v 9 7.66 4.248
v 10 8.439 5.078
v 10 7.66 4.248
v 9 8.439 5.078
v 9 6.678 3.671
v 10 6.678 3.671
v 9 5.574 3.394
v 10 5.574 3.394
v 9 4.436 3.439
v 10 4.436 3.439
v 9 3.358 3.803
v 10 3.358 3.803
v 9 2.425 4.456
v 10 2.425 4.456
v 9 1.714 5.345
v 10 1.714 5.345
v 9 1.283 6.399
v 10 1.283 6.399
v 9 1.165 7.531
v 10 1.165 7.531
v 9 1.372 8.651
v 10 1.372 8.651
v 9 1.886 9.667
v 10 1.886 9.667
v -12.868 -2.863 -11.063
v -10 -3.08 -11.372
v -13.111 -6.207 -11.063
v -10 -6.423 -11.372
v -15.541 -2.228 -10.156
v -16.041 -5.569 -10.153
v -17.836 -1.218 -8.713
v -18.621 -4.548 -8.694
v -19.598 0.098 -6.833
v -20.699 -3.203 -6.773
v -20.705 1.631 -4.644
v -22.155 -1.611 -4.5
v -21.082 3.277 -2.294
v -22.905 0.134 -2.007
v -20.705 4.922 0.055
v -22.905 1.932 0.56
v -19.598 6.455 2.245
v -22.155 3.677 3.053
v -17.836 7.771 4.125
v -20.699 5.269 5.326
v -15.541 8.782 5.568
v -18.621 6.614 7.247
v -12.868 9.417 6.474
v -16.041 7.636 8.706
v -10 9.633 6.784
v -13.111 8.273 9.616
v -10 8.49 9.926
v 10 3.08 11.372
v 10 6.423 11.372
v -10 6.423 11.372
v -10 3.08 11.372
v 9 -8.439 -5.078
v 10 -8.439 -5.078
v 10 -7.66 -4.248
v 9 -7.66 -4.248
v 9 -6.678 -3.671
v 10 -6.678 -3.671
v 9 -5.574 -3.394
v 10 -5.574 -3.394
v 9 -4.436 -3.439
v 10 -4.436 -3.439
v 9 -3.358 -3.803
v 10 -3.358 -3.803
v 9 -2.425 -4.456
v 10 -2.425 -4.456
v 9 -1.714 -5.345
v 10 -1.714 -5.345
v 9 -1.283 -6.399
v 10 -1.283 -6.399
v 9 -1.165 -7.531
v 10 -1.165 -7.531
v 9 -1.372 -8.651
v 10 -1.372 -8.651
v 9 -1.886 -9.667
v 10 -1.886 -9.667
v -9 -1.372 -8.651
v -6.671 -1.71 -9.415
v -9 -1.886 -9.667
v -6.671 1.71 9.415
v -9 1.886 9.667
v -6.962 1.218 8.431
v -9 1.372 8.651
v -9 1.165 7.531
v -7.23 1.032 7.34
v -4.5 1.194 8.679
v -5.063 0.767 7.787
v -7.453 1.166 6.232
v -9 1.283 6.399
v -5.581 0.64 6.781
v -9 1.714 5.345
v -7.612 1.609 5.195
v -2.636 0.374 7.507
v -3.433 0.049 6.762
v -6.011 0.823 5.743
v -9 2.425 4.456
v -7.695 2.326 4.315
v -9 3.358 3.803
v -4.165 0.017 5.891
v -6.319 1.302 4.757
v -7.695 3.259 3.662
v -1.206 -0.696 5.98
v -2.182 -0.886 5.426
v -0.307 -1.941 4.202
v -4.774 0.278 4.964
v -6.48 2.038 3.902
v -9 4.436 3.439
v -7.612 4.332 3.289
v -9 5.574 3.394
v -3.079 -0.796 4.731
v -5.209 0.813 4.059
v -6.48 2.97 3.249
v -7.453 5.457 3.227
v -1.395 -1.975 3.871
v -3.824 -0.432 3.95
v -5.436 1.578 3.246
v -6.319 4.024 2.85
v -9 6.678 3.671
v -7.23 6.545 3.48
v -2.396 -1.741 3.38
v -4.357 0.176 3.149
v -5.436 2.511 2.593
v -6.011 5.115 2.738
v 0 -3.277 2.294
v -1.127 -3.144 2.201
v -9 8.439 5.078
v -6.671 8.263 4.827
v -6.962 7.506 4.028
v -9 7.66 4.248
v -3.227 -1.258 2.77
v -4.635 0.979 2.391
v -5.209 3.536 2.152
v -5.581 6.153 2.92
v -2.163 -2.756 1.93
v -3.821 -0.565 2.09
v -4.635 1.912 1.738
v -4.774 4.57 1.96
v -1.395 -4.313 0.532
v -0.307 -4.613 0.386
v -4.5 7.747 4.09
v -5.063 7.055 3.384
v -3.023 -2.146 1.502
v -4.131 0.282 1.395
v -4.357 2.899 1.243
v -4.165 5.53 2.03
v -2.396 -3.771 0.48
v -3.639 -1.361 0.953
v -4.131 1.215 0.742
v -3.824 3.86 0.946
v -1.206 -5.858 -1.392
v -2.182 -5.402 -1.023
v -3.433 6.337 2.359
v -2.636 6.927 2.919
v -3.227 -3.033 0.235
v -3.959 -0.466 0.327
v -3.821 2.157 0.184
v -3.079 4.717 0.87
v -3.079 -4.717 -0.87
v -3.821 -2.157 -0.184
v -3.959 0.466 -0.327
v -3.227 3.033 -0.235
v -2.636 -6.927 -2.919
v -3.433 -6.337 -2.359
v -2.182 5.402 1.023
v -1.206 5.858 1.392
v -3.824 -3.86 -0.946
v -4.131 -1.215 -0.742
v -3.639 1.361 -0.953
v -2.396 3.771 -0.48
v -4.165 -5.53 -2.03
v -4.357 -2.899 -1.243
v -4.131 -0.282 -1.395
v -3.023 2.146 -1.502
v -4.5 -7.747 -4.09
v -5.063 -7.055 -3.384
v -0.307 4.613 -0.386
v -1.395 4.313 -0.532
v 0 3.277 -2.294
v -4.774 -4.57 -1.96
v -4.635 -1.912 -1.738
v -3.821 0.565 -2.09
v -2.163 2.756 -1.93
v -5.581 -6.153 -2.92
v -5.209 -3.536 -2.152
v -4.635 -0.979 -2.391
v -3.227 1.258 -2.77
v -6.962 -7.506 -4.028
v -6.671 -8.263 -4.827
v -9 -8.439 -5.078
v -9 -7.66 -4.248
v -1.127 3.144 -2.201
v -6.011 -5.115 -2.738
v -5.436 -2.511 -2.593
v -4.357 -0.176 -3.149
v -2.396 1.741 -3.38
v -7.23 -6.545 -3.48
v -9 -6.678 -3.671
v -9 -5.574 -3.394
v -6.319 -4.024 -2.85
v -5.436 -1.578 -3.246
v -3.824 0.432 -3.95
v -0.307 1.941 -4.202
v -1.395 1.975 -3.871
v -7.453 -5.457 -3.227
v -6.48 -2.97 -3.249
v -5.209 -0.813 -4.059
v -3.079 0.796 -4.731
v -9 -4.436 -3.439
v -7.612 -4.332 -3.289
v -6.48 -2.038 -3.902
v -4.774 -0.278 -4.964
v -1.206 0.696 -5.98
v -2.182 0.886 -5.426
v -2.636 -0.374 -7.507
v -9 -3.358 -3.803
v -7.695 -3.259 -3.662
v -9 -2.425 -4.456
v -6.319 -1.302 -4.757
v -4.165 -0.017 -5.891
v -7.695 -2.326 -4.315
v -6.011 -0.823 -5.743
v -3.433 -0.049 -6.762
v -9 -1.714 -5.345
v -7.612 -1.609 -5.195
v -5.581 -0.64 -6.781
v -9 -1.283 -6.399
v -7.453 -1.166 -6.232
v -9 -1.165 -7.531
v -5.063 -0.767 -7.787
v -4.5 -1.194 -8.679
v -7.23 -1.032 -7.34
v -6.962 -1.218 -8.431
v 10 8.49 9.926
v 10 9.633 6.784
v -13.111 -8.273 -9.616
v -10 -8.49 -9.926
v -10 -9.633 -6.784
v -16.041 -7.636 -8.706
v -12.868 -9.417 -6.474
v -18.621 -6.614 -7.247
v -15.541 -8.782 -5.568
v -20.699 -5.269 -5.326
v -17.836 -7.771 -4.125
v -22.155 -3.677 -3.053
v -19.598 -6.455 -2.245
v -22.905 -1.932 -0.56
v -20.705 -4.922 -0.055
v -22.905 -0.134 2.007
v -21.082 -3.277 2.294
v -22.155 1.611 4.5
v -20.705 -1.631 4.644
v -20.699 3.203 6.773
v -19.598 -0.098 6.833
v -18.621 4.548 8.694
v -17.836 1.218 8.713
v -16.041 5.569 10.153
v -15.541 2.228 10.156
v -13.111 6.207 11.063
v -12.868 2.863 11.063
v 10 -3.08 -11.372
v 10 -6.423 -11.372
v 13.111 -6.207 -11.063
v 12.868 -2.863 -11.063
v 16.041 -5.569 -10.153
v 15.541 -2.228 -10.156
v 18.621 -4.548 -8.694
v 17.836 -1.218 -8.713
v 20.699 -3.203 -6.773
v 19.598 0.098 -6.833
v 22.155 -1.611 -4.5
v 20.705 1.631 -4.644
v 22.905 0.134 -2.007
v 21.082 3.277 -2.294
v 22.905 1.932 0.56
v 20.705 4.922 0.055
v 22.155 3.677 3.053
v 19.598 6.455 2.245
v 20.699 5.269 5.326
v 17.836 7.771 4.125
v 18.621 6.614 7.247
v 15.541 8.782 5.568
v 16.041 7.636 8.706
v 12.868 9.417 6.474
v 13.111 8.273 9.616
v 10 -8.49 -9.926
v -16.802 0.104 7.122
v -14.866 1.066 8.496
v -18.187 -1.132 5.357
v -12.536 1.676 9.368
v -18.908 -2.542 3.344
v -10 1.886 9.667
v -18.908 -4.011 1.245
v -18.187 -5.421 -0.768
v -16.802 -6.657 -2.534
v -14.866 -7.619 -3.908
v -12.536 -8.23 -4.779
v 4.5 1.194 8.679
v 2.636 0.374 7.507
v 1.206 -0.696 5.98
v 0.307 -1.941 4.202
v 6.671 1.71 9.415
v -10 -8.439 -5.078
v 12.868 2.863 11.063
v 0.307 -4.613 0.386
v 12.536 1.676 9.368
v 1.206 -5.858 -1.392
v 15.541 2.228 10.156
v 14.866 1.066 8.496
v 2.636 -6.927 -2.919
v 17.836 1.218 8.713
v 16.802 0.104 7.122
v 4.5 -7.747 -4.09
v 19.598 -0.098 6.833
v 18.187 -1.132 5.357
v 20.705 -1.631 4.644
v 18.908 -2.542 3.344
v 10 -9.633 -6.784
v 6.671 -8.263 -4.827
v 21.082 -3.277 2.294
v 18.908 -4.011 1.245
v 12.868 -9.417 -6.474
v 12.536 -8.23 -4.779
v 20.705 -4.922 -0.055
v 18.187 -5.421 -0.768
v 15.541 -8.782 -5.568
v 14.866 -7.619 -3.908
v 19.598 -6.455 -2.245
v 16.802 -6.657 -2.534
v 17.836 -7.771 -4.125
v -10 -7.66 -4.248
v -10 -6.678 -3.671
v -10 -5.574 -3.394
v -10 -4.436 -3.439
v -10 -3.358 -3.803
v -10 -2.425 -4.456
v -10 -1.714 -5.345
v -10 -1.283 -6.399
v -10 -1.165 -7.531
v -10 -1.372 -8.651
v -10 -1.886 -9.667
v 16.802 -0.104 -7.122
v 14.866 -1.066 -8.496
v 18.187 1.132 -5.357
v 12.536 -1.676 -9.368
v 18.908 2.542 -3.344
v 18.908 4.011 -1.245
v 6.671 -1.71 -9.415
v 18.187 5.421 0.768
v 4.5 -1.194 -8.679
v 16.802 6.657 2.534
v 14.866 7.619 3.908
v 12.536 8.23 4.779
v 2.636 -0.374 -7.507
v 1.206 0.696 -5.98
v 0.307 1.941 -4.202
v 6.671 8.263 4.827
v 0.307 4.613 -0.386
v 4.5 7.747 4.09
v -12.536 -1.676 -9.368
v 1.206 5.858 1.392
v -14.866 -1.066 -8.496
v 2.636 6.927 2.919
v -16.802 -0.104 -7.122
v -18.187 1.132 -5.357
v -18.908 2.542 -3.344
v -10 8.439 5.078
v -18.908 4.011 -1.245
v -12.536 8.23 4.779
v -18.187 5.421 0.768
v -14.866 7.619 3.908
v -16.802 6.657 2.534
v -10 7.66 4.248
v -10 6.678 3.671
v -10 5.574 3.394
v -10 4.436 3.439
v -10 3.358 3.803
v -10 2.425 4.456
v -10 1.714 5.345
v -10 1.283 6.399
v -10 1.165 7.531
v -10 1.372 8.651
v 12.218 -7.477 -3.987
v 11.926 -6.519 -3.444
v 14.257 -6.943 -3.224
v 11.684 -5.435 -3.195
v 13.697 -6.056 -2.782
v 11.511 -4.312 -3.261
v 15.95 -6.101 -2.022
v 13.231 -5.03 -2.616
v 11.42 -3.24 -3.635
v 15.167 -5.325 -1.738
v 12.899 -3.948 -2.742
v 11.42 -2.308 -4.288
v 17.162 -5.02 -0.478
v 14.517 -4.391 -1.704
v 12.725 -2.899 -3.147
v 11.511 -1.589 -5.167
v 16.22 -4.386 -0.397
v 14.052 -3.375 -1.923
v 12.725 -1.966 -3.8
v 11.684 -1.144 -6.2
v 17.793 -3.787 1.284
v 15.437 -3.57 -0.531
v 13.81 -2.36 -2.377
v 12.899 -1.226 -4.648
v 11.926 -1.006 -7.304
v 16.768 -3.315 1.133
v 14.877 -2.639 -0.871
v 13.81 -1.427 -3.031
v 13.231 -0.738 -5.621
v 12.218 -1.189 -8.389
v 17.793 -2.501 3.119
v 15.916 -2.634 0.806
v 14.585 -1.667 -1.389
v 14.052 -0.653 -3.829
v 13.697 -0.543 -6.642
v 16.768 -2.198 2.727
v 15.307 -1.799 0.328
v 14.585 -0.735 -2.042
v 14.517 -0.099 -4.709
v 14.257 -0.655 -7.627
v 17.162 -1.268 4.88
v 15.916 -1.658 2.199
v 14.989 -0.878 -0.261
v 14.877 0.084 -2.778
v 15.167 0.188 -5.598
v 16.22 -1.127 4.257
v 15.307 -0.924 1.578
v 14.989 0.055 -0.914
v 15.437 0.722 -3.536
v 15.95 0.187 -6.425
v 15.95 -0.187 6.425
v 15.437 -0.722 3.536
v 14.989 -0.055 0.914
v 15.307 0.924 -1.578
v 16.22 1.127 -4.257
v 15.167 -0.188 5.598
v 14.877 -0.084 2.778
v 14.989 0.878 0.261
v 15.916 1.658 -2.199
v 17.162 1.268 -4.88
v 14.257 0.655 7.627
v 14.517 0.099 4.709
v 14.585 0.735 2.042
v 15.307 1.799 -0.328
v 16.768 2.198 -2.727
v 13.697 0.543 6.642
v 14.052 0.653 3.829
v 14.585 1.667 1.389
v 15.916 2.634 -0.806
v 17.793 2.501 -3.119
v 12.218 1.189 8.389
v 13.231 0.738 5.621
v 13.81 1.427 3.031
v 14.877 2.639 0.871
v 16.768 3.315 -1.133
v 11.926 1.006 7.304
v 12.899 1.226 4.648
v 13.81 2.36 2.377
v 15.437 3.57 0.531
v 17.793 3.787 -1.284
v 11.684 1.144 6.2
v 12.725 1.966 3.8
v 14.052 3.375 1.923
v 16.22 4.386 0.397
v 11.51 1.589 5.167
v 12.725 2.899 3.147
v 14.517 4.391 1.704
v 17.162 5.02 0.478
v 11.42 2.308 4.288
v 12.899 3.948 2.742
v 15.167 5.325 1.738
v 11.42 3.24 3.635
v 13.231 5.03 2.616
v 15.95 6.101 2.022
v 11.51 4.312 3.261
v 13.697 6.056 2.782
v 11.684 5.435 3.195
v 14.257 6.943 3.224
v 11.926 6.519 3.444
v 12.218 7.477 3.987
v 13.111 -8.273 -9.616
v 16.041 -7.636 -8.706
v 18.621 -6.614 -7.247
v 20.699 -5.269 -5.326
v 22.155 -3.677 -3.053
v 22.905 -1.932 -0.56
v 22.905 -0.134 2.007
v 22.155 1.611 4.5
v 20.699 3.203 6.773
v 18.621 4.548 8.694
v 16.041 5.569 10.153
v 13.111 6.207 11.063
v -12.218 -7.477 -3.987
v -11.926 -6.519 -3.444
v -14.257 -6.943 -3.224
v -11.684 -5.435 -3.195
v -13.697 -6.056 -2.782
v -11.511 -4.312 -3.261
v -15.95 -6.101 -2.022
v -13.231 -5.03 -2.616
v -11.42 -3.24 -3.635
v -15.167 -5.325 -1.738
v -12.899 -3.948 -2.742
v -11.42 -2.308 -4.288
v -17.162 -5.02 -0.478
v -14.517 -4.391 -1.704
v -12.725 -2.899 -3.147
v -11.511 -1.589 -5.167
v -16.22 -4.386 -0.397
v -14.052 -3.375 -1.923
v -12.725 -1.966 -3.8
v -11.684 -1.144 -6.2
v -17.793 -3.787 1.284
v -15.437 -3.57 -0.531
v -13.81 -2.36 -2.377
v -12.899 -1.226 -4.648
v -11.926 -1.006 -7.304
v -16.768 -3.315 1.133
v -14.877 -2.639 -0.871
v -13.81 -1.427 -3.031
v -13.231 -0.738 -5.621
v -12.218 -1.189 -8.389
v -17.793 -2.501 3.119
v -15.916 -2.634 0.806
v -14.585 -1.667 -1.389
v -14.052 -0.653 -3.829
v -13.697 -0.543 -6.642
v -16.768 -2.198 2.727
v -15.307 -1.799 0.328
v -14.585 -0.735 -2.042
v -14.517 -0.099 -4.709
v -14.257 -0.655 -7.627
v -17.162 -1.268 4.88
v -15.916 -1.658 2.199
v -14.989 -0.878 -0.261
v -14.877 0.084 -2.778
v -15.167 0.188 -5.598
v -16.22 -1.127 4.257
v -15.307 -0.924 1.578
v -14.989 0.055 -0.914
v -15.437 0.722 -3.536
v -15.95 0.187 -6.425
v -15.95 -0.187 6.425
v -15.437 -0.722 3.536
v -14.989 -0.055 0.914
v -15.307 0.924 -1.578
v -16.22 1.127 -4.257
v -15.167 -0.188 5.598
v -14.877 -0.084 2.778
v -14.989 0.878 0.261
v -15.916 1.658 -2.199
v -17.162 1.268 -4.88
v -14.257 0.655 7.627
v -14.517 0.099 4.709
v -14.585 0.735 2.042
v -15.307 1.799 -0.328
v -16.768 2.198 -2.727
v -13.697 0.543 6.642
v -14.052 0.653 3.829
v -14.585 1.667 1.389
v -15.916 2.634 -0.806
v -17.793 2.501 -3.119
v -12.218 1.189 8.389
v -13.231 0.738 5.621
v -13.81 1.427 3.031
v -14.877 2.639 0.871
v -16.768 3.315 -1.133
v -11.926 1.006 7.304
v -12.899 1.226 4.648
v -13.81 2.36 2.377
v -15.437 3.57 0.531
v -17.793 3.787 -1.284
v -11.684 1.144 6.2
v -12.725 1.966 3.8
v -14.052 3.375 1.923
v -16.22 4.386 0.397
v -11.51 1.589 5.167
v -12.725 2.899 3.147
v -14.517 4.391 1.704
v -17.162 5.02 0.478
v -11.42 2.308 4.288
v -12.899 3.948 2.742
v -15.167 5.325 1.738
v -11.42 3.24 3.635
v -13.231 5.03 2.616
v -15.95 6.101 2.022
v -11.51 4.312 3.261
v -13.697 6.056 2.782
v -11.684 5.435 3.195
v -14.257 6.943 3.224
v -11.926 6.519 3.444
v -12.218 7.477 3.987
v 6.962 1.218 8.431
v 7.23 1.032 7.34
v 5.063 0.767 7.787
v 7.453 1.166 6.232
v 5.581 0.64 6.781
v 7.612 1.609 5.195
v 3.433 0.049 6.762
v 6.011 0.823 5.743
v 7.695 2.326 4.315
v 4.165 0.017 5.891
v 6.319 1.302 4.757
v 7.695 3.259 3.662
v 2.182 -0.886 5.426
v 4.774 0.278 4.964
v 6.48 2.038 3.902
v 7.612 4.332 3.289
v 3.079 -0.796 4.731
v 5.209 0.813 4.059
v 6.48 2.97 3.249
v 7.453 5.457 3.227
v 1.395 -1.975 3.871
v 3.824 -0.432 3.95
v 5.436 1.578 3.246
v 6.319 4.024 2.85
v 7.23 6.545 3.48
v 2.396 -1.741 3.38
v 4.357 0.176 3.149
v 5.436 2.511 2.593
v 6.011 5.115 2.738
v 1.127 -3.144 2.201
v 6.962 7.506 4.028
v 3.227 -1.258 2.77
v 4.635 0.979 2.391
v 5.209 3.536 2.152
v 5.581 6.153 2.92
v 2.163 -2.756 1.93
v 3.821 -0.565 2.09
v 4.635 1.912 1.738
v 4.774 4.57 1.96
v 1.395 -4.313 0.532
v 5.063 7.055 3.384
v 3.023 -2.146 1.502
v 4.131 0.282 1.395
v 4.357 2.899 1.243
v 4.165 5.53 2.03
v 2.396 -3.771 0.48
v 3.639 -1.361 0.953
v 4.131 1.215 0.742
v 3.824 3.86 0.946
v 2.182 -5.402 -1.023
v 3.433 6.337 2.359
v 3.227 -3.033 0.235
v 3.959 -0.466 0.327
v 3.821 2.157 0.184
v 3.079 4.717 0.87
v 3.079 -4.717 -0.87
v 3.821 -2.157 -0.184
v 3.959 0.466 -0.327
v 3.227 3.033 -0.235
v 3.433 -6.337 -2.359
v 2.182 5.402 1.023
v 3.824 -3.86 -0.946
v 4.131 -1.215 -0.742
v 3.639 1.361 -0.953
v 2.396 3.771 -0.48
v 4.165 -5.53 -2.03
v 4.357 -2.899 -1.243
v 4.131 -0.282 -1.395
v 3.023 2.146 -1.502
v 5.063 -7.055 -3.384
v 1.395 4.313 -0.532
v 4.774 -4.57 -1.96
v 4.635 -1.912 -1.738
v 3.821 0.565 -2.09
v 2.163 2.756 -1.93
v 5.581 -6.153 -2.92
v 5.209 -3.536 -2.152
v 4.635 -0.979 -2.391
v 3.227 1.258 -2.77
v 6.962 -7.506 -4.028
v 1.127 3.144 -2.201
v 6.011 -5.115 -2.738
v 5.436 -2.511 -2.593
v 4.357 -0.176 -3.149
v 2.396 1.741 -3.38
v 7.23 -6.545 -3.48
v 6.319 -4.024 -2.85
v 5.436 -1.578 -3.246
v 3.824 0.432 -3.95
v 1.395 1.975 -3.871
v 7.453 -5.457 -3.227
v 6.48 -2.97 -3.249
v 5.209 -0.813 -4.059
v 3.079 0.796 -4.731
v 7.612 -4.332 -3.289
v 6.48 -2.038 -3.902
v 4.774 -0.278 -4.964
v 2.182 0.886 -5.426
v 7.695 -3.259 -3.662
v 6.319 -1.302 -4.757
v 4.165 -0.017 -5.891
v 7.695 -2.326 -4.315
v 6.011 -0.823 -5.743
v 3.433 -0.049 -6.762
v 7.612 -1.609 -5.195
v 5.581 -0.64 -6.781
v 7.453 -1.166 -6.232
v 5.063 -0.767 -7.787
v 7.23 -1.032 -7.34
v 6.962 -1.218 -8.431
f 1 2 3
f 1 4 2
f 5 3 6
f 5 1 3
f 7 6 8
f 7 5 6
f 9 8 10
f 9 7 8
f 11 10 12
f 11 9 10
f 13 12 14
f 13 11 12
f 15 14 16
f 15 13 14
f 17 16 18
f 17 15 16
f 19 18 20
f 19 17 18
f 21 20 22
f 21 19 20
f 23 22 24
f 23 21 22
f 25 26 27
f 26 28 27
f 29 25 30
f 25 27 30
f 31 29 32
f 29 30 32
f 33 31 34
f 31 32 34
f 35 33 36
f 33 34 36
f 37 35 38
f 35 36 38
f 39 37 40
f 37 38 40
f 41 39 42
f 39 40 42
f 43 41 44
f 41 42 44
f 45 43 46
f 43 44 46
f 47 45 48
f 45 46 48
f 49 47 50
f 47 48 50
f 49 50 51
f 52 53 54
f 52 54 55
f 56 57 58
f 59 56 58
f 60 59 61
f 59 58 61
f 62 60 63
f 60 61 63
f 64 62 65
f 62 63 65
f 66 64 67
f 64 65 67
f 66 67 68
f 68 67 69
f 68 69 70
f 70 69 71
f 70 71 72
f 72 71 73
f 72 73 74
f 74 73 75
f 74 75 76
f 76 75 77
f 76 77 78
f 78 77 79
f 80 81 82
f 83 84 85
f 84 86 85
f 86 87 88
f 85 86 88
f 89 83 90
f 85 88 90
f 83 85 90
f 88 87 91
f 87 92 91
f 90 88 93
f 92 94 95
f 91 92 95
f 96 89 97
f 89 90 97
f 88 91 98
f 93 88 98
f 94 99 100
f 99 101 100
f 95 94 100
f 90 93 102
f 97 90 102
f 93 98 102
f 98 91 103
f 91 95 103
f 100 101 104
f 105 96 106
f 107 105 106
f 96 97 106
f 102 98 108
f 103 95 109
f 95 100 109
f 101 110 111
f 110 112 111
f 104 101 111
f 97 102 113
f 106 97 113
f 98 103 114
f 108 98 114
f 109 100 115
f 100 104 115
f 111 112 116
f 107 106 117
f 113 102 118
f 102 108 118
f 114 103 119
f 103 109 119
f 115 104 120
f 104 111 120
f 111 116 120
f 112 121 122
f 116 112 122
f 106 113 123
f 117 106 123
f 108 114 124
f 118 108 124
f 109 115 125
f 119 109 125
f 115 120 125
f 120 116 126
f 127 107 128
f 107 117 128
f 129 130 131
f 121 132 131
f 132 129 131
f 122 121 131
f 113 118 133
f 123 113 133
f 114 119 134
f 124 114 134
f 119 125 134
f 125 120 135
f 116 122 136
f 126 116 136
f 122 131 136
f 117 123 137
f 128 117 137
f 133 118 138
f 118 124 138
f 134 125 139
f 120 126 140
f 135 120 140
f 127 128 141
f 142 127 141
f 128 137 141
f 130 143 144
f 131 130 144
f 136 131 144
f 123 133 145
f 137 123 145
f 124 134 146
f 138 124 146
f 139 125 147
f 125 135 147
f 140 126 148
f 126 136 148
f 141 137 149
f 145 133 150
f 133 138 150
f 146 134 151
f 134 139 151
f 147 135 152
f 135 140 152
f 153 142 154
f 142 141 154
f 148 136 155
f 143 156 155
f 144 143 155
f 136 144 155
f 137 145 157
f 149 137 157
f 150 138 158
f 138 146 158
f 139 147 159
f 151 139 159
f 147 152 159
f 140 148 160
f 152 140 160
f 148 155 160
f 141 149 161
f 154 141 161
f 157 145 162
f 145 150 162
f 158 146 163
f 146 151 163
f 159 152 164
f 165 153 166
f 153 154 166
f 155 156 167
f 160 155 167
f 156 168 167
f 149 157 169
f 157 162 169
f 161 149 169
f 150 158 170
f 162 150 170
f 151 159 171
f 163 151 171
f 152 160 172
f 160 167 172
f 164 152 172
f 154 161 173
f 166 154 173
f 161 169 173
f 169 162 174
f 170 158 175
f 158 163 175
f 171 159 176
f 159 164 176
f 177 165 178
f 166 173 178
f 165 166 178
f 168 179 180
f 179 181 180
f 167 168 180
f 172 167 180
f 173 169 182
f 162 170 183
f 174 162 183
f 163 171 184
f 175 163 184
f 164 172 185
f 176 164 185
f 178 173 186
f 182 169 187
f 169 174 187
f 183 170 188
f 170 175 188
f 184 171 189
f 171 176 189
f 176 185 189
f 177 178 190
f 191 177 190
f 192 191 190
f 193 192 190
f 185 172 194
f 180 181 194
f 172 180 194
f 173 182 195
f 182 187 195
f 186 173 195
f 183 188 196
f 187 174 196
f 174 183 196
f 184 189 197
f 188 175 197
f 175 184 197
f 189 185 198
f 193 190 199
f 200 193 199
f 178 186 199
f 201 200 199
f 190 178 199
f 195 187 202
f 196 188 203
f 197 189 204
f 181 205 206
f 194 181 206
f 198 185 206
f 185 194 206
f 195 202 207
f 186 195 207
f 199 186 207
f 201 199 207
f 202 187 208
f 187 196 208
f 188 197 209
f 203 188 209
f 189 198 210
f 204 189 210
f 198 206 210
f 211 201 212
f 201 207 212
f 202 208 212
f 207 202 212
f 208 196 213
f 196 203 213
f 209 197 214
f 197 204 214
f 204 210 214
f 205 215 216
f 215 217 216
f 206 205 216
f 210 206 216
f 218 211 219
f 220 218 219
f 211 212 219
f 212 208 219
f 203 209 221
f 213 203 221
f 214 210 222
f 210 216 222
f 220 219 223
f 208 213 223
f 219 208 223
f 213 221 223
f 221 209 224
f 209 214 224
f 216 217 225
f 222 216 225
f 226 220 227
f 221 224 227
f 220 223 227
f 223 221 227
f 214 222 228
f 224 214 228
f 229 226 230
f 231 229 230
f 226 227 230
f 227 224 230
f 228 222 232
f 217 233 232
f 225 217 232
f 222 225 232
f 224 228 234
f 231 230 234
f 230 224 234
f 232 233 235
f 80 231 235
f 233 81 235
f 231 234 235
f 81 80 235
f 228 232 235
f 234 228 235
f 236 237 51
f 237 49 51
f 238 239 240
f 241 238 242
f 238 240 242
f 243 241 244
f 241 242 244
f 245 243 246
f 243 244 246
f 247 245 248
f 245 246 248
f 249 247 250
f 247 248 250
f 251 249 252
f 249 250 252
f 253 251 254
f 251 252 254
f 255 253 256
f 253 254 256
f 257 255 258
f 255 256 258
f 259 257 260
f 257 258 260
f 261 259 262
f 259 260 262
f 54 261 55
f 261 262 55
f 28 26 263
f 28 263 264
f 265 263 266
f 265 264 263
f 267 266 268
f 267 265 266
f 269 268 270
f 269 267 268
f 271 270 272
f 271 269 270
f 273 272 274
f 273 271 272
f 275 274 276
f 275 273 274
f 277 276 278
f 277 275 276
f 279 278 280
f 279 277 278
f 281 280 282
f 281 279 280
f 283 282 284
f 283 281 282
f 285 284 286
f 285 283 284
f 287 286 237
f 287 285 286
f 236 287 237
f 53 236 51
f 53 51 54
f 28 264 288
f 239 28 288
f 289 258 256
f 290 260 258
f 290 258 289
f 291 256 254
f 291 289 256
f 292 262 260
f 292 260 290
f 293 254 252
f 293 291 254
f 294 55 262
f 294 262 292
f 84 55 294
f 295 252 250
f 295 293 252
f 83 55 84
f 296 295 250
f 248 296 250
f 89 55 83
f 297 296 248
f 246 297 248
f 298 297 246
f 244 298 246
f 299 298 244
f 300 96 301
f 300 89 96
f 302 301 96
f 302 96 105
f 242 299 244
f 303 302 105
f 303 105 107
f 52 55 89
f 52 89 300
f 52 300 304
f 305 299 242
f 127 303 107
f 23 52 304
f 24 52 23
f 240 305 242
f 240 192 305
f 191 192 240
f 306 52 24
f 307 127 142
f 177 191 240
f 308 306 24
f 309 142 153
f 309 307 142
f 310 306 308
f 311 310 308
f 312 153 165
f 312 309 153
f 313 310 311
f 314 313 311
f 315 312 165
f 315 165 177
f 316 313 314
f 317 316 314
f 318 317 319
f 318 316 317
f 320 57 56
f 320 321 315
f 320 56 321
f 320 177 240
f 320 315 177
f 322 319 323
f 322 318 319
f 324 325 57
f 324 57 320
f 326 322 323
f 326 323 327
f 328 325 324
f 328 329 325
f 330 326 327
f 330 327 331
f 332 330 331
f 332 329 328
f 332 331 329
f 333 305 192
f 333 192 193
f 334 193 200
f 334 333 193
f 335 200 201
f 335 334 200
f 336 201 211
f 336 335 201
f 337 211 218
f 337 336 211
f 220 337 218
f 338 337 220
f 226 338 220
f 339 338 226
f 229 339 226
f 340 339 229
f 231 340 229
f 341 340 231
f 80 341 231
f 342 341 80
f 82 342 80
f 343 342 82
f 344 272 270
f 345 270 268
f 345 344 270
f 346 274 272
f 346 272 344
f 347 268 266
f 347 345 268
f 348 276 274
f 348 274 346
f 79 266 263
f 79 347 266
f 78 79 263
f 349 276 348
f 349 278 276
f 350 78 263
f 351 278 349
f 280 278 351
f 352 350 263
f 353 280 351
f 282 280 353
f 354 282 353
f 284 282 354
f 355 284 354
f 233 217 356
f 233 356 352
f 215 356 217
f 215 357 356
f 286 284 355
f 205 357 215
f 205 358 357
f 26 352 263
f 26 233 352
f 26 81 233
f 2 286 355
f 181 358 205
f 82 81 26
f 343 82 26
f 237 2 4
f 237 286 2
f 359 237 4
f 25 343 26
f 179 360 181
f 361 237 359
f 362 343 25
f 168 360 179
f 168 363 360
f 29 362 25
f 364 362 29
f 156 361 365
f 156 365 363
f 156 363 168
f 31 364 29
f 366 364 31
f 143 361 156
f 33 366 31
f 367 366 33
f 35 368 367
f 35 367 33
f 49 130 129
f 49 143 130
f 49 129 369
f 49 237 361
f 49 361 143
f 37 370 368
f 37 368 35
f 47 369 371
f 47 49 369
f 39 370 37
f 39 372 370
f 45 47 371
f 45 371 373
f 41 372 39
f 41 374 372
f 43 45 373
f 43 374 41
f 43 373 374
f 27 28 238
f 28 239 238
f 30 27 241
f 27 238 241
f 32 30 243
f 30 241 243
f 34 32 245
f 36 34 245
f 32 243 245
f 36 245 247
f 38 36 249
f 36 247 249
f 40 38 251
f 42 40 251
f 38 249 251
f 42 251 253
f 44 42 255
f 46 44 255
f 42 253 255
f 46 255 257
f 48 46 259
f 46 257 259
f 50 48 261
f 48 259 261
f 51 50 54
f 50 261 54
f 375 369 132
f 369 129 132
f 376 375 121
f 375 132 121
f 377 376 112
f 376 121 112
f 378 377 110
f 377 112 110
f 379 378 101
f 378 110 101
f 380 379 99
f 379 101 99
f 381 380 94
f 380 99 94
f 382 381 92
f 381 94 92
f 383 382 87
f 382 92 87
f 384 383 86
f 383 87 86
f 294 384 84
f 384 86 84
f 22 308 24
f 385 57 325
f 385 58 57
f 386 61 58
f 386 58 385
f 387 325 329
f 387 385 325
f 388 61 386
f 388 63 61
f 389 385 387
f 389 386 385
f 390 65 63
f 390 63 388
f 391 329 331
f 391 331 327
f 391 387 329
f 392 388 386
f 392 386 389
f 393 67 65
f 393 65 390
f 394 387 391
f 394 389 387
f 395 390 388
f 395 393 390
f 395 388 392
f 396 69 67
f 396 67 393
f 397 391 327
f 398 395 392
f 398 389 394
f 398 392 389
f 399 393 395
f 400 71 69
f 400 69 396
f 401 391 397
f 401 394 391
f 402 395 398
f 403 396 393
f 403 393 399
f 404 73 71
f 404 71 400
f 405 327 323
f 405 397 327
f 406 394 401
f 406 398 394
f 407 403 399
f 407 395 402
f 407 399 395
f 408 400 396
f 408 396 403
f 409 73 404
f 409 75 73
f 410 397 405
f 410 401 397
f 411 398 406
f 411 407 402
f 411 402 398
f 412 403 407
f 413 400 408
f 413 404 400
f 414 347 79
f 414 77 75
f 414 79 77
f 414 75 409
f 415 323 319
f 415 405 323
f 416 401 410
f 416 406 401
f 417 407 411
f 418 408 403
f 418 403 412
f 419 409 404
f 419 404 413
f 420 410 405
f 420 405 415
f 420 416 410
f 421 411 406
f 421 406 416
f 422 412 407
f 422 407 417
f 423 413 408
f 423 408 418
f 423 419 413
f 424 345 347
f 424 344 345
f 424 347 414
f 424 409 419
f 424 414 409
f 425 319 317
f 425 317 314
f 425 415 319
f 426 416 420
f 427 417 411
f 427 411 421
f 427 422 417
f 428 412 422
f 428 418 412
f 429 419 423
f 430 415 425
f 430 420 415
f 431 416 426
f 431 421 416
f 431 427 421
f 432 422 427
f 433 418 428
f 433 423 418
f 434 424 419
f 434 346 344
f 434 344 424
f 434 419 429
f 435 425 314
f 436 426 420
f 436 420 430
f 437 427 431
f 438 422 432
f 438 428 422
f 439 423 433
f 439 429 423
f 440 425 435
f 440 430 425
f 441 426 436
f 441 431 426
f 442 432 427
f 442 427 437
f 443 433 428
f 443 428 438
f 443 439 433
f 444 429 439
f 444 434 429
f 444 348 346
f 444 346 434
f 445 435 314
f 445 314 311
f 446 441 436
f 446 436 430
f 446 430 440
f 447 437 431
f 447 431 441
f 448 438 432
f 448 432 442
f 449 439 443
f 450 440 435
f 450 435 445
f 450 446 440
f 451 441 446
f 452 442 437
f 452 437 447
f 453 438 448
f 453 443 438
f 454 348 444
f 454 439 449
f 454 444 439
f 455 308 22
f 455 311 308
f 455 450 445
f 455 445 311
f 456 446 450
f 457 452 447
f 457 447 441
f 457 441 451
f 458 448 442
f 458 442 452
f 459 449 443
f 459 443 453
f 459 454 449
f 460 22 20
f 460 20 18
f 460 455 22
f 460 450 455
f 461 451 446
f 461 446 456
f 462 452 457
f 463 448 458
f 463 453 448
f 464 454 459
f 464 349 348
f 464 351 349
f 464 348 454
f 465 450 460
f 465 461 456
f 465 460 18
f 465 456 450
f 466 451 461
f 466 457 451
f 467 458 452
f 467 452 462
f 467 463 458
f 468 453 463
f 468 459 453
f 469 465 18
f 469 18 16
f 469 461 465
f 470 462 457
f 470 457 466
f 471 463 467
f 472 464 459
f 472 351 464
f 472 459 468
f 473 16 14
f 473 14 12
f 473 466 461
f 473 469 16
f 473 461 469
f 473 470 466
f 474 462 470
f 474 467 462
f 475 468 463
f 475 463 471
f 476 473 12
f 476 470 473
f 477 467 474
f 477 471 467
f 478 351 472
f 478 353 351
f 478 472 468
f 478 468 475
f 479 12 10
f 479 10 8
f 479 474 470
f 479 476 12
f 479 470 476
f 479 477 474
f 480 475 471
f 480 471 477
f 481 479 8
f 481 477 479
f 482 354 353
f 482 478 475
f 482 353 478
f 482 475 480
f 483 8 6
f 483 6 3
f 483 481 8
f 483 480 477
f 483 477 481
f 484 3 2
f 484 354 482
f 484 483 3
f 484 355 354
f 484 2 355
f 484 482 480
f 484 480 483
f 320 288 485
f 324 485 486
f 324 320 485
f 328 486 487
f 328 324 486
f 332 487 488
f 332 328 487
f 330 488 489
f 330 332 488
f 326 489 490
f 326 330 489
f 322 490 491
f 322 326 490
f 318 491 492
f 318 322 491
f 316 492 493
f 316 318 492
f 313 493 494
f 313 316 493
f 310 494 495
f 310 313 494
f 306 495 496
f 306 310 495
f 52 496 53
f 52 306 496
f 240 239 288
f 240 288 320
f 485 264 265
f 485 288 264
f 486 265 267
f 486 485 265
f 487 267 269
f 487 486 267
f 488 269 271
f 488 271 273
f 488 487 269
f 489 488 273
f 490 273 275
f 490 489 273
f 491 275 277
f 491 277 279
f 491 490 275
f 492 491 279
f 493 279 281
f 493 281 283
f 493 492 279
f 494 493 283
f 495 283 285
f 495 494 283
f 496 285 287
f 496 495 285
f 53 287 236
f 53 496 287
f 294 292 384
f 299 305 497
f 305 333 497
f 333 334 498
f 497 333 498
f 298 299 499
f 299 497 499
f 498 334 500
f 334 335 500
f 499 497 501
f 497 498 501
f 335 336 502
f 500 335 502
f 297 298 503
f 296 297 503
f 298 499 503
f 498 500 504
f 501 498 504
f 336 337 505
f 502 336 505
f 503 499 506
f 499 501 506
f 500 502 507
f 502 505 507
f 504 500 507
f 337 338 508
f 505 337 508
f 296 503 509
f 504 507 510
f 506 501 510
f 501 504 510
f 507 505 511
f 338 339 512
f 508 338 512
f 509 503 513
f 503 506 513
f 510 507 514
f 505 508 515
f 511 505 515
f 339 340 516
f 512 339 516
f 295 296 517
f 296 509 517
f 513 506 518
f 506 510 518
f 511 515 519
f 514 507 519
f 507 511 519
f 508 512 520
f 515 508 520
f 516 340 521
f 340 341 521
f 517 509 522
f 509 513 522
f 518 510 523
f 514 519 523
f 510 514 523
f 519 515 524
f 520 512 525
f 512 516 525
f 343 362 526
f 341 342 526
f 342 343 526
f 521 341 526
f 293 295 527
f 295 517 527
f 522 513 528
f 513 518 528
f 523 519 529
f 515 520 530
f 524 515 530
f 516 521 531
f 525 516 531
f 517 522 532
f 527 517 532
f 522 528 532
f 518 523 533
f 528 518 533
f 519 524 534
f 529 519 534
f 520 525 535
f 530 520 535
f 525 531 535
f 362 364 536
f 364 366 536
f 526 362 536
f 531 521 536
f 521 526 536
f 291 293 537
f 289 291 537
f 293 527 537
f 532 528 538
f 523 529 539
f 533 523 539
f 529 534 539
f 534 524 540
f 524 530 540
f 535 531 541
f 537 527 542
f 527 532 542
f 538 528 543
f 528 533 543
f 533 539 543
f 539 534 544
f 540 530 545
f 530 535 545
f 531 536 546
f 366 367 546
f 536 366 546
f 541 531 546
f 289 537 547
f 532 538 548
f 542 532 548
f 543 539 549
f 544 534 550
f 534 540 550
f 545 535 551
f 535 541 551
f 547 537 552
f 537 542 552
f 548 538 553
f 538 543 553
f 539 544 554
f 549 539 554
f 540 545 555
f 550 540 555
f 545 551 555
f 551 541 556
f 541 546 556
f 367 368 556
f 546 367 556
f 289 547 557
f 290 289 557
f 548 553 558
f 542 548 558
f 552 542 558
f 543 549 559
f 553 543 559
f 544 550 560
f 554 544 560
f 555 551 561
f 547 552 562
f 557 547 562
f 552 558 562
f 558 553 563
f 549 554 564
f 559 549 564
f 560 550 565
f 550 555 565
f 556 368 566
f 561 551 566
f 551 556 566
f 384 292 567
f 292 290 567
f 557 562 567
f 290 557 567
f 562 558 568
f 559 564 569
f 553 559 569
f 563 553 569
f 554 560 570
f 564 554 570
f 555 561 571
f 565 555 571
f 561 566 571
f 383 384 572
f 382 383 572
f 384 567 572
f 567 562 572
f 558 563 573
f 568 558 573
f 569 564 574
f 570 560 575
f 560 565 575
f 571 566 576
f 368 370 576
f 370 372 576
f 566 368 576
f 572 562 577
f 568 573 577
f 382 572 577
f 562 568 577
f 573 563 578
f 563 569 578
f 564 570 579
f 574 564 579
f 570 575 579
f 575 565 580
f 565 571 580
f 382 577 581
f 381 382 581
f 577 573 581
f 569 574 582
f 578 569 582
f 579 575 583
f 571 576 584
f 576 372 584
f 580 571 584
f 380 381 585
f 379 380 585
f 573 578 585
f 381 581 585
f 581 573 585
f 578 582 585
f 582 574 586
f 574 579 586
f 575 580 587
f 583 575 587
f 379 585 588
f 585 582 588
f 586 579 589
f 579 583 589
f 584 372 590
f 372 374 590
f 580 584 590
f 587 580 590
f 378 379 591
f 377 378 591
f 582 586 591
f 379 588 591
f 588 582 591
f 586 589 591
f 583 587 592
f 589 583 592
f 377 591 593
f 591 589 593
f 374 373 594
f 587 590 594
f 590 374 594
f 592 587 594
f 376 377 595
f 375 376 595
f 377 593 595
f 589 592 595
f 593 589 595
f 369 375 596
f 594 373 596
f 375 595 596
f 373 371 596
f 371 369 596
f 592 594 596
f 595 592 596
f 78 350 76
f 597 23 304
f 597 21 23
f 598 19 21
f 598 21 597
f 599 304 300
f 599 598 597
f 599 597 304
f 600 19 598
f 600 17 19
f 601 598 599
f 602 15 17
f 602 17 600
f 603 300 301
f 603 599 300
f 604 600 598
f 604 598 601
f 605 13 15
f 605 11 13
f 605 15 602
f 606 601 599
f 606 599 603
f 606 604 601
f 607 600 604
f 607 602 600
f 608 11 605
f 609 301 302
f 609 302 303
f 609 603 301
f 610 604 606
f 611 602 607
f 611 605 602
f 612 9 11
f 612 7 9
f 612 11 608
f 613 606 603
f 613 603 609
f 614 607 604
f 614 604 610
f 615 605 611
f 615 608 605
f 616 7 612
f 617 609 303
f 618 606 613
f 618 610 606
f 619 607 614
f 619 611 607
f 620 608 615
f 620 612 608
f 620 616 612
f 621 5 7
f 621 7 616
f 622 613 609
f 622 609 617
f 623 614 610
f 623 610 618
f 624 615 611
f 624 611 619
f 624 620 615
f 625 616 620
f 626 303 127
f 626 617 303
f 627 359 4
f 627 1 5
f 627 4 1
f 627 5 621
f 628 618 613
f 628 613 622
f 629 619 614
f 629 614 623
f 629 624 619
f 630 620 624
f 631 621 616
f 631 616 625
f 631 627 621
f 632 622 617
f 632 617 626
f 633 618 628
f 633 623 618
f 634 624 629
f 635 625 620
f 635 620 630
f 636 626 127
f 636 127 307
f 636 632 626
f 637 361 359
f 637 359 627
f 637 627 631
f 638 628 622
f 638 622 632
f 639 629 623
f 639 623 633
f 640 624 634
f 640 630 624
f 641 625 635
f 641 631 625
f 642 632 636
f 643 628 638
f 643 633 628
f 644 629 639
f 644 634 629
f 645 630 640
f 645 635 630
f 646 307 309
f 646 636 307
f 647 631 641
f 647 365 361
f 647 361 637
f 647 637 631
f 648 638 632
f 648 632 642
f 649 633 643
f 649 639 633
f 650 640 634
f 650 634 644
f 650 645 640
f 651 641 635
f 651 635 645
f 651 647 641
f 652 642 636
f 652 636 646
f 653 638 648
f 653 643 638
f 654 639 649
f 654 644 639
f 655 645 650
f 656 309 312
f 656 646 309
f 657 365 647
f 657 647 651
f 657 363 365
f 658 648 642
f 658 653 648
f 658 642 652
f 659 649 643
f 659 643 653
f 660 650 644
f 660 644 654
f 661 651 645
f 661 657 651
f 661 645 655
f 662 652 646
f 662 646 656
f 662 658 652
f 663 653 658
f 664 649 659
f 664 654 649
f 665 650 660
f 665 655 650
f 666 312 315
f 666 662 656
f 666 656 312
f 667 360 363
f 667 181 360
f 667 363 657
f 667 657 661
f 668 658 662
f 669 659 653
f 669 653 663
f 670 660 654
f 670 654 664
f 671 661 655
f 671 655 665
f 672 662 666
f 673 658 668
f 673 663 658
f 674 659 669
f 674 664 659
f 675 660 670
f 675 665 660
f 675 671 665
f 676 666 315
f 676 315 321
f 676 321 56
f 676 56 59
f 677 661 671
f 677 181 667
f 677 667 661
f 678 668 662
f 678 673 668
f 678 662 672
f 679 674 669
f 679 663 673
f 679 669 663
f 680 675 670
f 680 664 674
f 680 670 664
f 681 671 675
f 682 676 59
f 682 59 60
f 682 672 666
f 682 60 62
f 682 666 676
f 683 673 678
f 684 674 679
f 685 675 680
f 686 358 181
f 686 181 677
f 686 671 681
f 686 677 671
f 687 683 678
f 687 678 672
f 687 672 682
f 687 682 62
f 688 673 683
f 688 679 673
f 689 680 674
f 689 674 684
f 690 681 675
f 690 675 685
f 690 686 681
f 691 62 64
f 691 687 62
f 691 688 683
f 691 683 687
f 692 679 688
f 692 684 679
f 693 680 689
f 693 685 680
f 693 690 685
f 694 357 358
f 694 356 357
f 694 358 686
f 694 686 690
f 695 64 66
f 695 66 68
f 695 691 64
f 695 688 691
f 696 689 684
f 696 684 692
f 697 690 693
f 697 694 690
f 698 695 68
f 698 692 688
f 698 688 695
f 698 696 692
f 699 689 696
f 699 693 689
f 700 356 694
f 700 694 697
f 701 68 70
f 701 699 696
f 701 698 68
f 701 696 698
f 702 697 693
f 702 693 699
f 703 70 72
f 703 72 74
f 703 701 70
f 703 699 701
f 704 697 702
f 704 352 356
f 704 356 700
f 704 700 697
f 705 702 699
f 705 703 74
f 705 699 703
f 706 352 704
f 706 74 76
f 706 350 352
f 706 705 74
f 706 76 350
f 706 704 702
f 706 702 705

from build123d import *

# Parameters (mm, degrees)
PAD002_DEPTH           = 4
SKETCH020_W            = 5
SKETCH020_H            = 30
POCKET003_DEPTH        = 4.001
POCKET003_DEPTH_BACK   = 4.001
FUSION_PLACEMENT_ANGLE = 35


with BuildPart() as fatlink:
    # AdditivePipe003: sweep along a path in Sketch015
    with BuildLine(Plane.XZ) as additivepipe003_path:
        Line((0, -9), (10, -9))
        ThreePointArc((10, -9), (19, 2e-06), (9.999996, 9))
        Line((9.999996, 9), (0, 9))
    # Sketch016 → AdditivePipe003 (sweep)
    with BuildSketch(Plane.YZ):
        with BuildLine():
            ThreePointArc((-4, 9), (0, 5), (4, 9))
            Line((4, 11.082268), (4, 9))
            Line((1.261195, 13), (4, 11.082268))
            Line((-1.261195, 13), (1.261195, 13))
            Line((-1.261195, 13), (-4, 11.082268))
            Line((-4, 9), (-4, 11.082268))
        make_face()
    sweep(path=additivepipe003_path.line)

    # AdditivePipe004: sweep along a path in Sketch017
    with BuildLine(Plane.XZ) as additivepipe004_path:
        ThreePointArc((9, 9), (0, 0), (9, -9))
    # Sketch018 → AdditivePipe004 (sweep)
    with BuildSketch(Plane.YZ.offset(9)):
        with BuildLine():
            ThreePointArc((-4, 9), (0, 5), (4, 9))
            Line((4, 11.082268), (4, 9))
            Line((1.261195, 13), (4, 11.082268))
            Line((-1.261195, 13), (1.261195, 13))
            Line((-1.261195, 13), (-4, 11.082268))
            Line((-4, 9), (-4, 11.082268))
        make_face()
    sweep(path=additivepipe004_path.line)

    # Sketch019 → Pad002 (new body, symmetric)
    with BuildSketch(Plane.XZ):
        with BuildLine():
            Line((0, 10), (3.5, 10))
            Line((3.5, 10), (3.5, 8.351647))
            ThreePointArc((3.5, 8.351647), (-1, 0), (3.5, -8.351647))
            Line((3.5, -8.351647), (3.5, -10))
            Line((3.5, -10), (0, -10))
            Line((0, -10), (-2, 0))
            Line((0, 10), (-2, 0))
        make_face()
    extrude(amount=PAD002_DEPTH, both=True)

    # Sketch020 → Pocket003 (cut, two sides)
    with BuildSketch(Plane.XZ) as pocket003_sk:
        with Locations((-2.5, 0)):
            Rectangle(SKETCH020_W, SKETCH020_H)
    extrude(amount=-POCKET003_DEPTH, mode=Mode.SUBTRACT)
    extrude(pocket003_sk.sketch, amount=POCKET003_DEPTH_BACK, mode=Mode.SUBTRACT)


with BuildPart() as fat_link:
    # Part__Mirroring: instance of FatLink
    add(fatlink.part.mirror(Plane(origin=(0, 0, 0), x_dir=(0, -1, 0), z_dir=(1, 0, 0))))

    # Fusion: union FatLink
    add(fatlink.part)


with BuildPart() as fat_link_1:
    # Fusion placement: moved
    add(fat_link.part.rotate(Axis((0, 0, 0), (-1, 0, 0)), FUSION_PLACEMENT_ANGLE))


solid = fat_link_1.part
